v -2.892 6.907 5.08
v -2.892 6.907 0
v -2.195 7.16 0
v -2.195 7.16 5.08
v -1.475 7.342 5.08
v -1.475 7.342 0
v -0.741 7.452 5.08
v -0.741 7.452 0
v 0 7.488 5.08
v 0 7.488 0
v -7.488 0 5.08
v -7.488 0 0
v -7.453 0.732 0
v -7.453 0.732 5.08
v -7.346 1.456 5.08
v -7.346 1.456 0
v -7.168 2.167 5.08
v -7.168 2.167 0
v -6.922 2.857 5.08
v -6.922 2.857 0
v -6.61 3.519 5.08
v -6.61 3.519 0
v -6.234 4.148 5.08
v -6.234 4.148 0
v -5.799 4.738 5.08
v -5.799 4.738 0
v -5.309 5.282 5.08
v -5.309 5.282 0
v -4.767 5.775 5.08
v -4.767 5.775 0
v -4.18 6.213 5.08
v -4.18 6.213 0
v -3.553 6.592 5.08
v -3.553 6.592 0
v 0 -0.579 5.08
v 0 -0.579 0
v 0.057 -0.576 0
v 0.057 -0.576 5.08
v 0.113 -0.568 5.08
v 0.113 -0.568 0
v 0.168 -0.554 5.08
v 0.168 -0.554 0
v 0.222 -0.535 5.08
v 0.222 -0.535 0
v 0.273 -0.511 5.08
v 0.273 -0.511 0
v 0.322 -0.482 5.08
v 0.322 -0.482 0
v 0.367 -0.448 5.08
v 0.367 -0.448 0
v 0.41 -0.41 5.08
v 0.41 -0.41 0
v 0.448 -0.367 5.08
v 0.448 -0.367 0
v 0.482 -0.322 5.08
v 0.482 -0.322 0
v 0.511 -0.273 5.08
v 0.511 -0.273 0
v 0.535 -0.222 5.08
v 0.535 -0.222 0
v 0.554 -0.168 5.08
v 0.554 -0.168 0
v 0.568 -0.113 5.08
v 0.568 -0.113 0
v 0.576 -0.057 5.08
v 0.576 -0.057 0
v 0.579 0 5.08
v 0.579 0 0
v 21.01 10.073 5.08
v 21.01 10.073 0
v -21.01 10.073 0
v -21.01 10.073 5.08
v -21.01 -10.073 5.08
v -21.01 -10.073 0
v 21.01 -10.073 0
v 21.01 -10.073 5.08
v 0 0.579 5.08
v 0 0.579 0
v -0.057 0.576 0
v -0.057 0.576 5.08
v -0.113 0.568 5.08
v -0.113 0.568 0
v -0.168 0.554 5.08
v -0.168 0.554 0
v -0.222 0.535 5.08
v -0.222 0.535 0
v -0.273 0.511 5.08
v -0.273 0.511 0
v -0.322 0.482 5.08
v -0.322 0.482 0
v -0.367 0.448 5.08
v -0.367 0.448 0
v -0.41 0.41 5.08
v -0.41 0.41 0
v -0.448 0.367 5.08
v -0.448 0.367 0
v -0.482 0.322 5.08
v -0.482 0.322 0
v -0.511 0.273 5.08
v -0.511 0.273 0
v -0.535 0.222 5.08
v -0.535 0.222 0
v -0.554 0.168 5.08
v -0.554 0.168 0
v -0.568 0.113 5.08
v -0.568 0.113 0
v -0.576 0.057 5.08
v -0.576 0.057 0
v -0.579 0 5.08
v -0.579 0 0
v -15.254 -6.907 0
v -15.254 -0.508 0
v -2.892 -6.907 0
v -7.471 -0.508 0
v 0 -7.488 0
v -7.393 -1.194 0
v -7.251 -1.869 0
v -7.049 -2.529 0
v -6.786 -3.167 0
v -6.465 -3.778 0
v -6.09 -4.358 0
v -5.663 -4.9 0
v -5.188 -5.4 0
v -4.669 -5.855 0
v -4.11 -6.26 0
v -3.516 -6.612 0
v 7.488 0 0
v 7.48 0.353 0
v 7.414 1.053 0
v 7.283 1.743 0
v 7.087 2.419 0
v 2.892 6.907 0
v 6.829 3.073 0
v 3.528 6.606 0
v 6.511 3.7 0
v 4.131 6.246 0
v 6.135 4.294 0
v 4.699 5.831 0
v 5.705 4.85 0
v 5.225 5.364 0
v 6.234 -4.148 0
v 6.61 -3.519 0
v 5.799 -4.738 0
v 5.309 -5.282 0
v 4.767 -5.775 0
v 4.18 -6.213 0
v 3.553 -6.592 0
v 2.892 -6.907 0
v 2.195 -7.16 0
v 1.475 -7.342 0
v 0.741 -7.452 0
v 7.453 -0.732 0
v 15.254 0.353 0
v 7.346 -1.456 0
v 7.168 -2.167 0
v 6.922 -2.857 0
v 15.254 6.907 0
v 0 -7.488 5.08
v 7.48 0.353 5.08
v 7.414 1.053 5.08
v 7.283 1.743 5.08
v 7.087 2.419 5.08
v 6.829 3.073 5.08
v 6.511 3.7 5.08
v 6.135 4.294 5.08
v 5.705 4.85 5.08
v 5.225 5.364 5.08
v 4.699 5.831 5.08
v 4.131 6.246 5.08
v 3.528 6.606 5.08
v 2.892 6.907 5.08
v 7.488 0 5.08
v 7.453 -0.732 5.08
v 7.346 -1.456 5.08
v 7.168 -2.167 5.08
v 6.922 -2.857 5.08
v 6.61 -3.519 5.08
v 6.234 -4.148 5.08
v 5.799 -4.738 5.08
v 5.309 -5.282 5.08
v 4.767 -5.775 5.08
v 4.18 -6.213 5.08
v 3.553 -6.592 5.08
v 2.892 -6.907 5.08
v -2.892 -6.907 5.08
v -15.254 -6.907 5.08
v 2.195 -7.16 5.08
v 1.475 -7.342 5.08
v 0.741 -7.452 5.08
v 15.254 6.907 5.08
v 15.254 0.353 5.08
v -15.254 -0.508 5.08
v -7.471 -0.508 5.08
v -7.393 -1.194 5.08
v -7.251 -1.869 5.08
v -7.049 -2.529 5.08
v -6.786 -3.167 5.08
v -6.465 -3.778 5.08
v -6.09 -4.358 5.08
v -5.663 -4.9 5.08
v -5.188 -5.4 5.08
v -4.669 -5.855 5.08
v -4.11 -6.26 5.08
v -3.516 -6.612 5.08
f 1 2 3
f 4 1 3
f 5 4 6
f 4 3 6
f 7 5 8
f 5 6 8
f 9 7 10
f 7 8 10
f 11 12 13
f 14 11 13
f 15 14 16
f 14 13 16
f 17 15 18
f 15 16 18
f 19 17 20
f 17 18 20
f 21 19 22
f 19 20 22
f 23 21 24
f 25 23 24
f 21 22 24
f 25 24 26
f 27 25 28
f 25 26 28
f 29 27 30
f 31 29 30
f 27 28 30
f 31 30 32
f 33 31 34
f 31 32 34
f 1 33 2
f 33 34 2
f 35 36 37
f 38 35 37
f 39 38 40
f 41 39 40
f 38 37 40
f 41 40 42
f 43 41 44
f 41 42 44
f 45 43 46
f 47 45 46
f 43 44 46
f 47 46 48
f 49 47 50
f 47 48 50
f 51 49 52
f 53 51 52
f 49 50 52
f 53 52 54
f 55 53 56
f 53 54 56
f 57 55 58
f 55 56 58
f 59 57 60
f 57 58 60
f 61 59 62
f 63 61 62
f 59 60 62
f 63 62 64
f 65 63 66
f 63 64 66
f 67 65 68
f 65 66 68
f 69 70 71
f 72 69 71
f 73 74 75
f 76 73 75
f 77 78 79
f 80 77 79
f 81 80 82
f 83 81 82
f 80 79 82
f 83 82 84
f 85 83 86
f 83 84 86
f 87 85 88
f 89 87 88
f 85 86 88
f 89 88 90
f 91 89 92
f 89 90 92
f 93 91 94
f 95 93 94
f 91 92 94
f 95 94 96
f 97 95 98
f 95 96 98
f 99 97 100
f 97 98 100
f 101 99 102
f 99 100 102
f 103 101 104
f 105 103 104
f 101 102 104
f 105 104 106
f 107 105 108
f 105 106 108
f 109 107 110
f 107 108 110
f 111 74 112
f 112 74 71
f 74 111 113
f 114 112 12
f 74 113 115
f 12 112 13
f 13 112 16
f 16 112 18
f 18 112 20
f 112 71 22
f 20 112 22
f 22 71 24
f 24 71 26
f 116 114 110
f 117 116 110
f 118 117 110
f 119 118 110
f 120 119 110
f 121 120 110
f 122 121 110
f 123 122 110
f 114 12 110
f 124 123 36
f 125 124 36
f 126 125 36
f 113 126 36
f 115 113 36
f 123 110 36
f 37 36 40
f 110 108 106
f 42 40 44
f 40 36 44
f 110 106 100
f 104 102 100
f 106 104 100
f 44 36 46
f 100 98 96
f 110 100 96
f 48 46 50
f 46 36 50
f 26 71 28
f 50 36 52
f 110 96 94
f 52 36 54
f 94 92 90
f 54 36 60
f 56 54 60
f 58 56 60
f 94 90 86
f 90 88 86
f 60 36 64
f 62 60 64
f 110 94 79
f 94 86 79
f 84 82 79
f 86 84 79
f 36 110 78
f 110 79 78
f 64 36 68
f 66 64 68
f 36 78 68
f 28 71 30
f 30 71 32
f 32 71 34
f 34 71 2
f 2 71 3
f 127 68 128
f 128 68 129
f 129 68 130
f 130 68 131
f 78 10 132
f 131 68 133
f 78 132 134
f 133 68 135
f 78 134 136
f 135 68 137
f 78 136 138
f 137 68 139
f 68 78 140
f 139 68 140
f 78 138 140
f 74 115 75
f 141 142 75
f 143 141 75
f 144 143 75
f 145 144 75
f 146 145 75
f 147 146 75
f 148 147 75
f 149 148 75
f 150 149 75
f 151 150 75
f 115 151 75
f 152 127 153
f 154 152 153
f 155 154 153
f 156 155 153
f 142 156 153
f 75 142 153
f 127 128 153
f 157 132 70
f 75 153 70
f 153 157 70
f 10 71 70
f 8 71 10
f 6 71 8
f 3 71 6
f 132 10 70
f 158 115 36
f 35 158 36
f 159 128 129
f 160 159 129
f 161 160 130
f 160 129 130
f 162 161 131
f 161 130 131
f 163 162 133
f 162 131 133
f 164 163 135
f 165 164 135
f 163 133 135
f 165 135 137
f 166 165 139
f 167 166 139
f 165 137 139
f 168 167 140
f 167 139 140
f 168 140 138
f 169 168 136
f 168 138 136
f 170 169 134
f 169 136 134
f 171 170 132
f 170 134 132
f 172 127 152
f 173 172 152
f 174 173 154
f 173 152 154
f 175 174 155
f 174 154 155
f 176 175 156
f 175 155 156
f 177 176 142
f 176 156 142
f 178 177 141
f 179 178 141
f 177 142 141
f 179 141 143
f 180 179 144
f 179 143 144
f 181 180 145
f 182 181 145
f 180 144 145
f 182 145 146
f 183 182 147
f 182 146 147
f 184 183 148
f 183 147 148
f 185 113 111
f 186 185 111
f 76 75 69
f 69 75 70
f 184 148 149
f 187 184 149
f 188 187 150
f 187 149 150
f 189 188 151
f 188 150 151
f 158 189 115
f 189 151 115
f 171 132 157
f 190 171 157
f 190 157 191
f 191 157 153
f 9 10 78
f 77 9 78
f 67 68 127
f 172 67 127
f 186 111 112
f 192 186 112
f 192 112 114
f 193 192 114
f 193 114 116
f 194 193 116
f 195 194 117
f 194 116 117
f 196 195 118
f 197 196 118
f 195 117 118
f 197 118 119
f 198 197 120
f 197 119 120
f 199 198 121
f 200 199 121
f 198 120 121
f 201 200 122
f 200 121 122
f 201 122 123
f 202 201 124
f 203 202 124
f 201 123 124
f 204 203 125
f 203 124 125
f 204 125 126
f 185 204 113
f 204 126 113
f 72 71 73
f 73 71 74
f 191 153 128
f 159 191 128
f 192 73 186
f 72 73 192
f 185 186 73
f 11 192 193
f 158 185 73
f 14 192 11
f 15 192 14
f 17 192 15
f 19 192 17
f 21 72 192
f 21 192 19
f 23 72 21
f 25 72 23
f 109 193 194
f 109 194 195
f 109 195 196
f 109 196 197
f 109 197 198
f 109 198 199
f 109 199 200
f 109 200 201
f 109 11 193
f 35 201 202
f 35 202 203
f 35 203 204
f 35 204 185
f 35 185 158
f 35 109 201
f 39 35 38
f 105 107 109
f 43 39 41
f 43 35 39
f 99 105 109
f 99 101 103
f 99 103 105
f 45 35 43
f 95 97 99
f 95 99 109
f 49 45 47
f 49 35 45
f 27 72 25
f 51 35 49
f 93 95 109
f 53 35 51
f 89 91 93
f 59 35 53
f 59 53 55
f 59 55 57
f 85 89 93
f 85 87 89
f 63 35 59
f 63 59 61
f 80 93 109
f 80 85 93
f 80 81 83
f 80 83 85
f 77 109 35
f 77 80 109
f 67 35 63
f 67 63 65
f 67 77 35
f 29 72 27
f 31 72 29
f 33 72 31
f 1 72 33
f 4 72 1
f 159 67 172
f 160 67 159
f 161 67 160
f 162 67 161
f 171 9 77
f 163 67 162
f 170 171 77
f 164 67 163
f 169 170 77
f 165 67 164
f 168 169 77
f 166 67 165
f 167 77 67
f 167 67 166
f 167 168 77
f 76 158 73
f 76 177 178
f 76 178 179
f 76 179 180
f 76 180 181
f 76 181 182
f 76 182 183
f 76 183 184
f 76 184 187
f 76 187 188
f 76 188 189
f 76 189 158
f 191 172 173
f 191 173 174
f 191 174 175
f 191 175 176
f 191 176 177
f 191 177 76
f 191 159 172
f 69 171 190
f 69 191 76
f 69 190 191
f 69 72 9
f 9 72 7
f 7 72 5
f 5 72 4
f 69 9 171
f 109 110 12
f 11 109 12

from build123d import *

# Parameters (mm, degrees)
F1_DEPTH = 5.08


with BuildPart() as f1:
    # F0 (on Top) → F1 (new body)
    with BuildSketch(Plane.XY):
        Polygon((21.0098195821, 10.0732017308), (0, 10.0732017308), (-21.0098195821, 10.0732017308), (-21.0098195821, 0), (-21.0098195821, -10.0732017308), (0, -10.0732017308), (21.0098195821, -10.0732017308), (21.0098195821, 0), align=None)
        with BuildLine():
            Line((15.2537059039, -6.9073382765), (2.8924141151, -6.9073382765))
            ThreePointArc((2.8924141151, -6.9073382765), (1.4751092249, -7.3417596157), (0, -7.4884832563))
            ThreePointArc((0, -7.4884832563), (-1.4751092249, -7.3417596157), (-2.8924141151, -6.9073382765))
            Line((-2.8924141151, -6.9073382765), (-15.2537059039, -6.9073382765))
            Line((-15.2537059039, -6.9073382765), (-15.2537059039, -0.5080337272))
            Line((-15.2537059039, -0.5080337272), (-15.2537059039, 0))
            Line((-15.2537059039, 0), (-15.2537059039, 6.9073382765))
            Line((-15.2537059039, 6.9073382765), (-2.8924141151, 6.9073382765))
            ThreePointArc((-2.8924141151, 6.9073382765), (-1.4751092249, 7.3417596157), (0, 7.4884832563))
            ThreePointArc((0, 7.4884832563), (1.4751092249, 7.3417596157), (2.8924141151, 6.9073382765))
            Line((2.8924141151, 6.9073382765), (15.2537059039, 6.9073382765))
            Line((15.2537059039, 6.9073382765), (15.2537059039, 0.3525706587))
            Line((15.2537059039, 0.3525706587), (15.2537059039, 0))
            Line((15.2537059039, 0), (15.2537059039, -6.9073382765))
        make_face(mode=Mode.SUBTRACT)
        with BuildLine():
            ThreePointArc((-7.4884832563, 0), (-6.234467746, 4.1483482742), (-2.8924141151, 6.9073382765))
            Line((-2.8924141151, 6.9073382765), (-15.2537059039, 6.9073382765))
            Line((-15.2537059039, 6.9073382765), (-15.2537059039, 0))
            Line((-15.2537059039, 0), (-15.2537059039, -0.5080337272))
            Line((-15.2537059039, -0.5080337272), (-7.471230368, -0.5080337272))
            ThreePointArc((-7.471230368, -0.5080337272), (-7.4841687913, -0.2541632989), (-7.4884832563, 0))
        make_face()
        with BuildLine():
            ThreePointArc((7.4801788354, 0.3525706587), (7.4864068632, 0.176334223), (7.4884832563, 0))
            ThreePointArc((7.4884832563, 0), (6.234467746, -4.1483482742), (2.8924141151, -6.9073382765))
            Line((2.8924141151, -6.9073382765), (15.2537059039, -6.9073382765))
            Line((15.2537059039, -6.9073382765), (15.2537059039, 0))
            Line((15.2537059039, 0), (15.2537059039, 0.3525706587))
            Line((15.2537059039, 0.3525706587), (7.4801788354, 0.3525706587))
        make_face()
        with BuildLine():
            ThreePointArc((-2.8924141151, -6.9073382765), (-1.4751092249, -7.3417596157), (0, -7.4884832563))
            Line((0, -7.4884832563), (0, -0.5792839078))
            ThreePointArc((0, -0.5792839078), (-0.4096155795, -0.4096155795), (-0.5792839078, 0))
            Line((-0.5792839078, 0), (-7.4884832563, 0))
            ThreePointArc((-7.4884832563, 0), (-7.4841687913, -0.2541632989), (-7.471230368, -0.5080337272))
            ThreePointArc((-7.471230368, -0.5080337272), (-6.0900785235, -4.35755953), (-2.8924141151, -6.9073382765))
        make_face()
        with BuildLine():
            Line((0.5792839078, 0), (7.4884832563, 0))
            ThreePointArc((7.4884832563, 0), (7.4864068632, 0.176334223), (7.4801788354, 0.3525706587))
            ThreePointArc((7.4801788354, 0.3525706587), (6.1350562964, 4.2940034605), (2.8924141151, 6.9073382765))
            ThreePointArc((2.8924141151, 6.9073382765), (1.4751092249, 7.3417596157), (0, 7.4884832563))
            Line((0, 7.4884832563), (0, 0.5792839078))
            ThreePointArc((0, 0.5792839078), (0.4096155795, 0.4096155795), (0.5792839078, 0))
        make_face()
        with BuildLine():
            Line((-0.5792839078, 0), (0, 0))
            Line((0, 0), (0, 0.5792839078))
            ThreePointArc((0, 0.5792839078), (-0.4096155795, 0.4096155795), (-0.5792839078, 0))
        make_face()
        with BuildLine():
            Line((0, 0), (0.5792839078, 0))
            ThreePointArc((0.5792839078, 0), (0.4096155795, 0.4096155795), (0, 0.5792839078))
            Line((0, 0.5792839078), (0, 0))
        make_face()
        with BuildLine():
            ThreePointArc((0, -0.5792839078), (0.4096155795, -0.4096155795), (0.5792839078, 0))
            Line((0.5792839078, 0), (0, 0))
            Line((0, 0), (0, -0.5792839078))
        make_face()
        with BuildLine():
            Line((0, -0.5792839078), (0, 0))
            Line((0, 0), (-0.5792839078, 0))
            ThreePointArc((-0.5792839078, 0), (-0.4096155795, -0.4096155795), (0, -0.5792839078))
        make_face()
    extrude(amount=F1_DEPTH)


solid = f1.part
